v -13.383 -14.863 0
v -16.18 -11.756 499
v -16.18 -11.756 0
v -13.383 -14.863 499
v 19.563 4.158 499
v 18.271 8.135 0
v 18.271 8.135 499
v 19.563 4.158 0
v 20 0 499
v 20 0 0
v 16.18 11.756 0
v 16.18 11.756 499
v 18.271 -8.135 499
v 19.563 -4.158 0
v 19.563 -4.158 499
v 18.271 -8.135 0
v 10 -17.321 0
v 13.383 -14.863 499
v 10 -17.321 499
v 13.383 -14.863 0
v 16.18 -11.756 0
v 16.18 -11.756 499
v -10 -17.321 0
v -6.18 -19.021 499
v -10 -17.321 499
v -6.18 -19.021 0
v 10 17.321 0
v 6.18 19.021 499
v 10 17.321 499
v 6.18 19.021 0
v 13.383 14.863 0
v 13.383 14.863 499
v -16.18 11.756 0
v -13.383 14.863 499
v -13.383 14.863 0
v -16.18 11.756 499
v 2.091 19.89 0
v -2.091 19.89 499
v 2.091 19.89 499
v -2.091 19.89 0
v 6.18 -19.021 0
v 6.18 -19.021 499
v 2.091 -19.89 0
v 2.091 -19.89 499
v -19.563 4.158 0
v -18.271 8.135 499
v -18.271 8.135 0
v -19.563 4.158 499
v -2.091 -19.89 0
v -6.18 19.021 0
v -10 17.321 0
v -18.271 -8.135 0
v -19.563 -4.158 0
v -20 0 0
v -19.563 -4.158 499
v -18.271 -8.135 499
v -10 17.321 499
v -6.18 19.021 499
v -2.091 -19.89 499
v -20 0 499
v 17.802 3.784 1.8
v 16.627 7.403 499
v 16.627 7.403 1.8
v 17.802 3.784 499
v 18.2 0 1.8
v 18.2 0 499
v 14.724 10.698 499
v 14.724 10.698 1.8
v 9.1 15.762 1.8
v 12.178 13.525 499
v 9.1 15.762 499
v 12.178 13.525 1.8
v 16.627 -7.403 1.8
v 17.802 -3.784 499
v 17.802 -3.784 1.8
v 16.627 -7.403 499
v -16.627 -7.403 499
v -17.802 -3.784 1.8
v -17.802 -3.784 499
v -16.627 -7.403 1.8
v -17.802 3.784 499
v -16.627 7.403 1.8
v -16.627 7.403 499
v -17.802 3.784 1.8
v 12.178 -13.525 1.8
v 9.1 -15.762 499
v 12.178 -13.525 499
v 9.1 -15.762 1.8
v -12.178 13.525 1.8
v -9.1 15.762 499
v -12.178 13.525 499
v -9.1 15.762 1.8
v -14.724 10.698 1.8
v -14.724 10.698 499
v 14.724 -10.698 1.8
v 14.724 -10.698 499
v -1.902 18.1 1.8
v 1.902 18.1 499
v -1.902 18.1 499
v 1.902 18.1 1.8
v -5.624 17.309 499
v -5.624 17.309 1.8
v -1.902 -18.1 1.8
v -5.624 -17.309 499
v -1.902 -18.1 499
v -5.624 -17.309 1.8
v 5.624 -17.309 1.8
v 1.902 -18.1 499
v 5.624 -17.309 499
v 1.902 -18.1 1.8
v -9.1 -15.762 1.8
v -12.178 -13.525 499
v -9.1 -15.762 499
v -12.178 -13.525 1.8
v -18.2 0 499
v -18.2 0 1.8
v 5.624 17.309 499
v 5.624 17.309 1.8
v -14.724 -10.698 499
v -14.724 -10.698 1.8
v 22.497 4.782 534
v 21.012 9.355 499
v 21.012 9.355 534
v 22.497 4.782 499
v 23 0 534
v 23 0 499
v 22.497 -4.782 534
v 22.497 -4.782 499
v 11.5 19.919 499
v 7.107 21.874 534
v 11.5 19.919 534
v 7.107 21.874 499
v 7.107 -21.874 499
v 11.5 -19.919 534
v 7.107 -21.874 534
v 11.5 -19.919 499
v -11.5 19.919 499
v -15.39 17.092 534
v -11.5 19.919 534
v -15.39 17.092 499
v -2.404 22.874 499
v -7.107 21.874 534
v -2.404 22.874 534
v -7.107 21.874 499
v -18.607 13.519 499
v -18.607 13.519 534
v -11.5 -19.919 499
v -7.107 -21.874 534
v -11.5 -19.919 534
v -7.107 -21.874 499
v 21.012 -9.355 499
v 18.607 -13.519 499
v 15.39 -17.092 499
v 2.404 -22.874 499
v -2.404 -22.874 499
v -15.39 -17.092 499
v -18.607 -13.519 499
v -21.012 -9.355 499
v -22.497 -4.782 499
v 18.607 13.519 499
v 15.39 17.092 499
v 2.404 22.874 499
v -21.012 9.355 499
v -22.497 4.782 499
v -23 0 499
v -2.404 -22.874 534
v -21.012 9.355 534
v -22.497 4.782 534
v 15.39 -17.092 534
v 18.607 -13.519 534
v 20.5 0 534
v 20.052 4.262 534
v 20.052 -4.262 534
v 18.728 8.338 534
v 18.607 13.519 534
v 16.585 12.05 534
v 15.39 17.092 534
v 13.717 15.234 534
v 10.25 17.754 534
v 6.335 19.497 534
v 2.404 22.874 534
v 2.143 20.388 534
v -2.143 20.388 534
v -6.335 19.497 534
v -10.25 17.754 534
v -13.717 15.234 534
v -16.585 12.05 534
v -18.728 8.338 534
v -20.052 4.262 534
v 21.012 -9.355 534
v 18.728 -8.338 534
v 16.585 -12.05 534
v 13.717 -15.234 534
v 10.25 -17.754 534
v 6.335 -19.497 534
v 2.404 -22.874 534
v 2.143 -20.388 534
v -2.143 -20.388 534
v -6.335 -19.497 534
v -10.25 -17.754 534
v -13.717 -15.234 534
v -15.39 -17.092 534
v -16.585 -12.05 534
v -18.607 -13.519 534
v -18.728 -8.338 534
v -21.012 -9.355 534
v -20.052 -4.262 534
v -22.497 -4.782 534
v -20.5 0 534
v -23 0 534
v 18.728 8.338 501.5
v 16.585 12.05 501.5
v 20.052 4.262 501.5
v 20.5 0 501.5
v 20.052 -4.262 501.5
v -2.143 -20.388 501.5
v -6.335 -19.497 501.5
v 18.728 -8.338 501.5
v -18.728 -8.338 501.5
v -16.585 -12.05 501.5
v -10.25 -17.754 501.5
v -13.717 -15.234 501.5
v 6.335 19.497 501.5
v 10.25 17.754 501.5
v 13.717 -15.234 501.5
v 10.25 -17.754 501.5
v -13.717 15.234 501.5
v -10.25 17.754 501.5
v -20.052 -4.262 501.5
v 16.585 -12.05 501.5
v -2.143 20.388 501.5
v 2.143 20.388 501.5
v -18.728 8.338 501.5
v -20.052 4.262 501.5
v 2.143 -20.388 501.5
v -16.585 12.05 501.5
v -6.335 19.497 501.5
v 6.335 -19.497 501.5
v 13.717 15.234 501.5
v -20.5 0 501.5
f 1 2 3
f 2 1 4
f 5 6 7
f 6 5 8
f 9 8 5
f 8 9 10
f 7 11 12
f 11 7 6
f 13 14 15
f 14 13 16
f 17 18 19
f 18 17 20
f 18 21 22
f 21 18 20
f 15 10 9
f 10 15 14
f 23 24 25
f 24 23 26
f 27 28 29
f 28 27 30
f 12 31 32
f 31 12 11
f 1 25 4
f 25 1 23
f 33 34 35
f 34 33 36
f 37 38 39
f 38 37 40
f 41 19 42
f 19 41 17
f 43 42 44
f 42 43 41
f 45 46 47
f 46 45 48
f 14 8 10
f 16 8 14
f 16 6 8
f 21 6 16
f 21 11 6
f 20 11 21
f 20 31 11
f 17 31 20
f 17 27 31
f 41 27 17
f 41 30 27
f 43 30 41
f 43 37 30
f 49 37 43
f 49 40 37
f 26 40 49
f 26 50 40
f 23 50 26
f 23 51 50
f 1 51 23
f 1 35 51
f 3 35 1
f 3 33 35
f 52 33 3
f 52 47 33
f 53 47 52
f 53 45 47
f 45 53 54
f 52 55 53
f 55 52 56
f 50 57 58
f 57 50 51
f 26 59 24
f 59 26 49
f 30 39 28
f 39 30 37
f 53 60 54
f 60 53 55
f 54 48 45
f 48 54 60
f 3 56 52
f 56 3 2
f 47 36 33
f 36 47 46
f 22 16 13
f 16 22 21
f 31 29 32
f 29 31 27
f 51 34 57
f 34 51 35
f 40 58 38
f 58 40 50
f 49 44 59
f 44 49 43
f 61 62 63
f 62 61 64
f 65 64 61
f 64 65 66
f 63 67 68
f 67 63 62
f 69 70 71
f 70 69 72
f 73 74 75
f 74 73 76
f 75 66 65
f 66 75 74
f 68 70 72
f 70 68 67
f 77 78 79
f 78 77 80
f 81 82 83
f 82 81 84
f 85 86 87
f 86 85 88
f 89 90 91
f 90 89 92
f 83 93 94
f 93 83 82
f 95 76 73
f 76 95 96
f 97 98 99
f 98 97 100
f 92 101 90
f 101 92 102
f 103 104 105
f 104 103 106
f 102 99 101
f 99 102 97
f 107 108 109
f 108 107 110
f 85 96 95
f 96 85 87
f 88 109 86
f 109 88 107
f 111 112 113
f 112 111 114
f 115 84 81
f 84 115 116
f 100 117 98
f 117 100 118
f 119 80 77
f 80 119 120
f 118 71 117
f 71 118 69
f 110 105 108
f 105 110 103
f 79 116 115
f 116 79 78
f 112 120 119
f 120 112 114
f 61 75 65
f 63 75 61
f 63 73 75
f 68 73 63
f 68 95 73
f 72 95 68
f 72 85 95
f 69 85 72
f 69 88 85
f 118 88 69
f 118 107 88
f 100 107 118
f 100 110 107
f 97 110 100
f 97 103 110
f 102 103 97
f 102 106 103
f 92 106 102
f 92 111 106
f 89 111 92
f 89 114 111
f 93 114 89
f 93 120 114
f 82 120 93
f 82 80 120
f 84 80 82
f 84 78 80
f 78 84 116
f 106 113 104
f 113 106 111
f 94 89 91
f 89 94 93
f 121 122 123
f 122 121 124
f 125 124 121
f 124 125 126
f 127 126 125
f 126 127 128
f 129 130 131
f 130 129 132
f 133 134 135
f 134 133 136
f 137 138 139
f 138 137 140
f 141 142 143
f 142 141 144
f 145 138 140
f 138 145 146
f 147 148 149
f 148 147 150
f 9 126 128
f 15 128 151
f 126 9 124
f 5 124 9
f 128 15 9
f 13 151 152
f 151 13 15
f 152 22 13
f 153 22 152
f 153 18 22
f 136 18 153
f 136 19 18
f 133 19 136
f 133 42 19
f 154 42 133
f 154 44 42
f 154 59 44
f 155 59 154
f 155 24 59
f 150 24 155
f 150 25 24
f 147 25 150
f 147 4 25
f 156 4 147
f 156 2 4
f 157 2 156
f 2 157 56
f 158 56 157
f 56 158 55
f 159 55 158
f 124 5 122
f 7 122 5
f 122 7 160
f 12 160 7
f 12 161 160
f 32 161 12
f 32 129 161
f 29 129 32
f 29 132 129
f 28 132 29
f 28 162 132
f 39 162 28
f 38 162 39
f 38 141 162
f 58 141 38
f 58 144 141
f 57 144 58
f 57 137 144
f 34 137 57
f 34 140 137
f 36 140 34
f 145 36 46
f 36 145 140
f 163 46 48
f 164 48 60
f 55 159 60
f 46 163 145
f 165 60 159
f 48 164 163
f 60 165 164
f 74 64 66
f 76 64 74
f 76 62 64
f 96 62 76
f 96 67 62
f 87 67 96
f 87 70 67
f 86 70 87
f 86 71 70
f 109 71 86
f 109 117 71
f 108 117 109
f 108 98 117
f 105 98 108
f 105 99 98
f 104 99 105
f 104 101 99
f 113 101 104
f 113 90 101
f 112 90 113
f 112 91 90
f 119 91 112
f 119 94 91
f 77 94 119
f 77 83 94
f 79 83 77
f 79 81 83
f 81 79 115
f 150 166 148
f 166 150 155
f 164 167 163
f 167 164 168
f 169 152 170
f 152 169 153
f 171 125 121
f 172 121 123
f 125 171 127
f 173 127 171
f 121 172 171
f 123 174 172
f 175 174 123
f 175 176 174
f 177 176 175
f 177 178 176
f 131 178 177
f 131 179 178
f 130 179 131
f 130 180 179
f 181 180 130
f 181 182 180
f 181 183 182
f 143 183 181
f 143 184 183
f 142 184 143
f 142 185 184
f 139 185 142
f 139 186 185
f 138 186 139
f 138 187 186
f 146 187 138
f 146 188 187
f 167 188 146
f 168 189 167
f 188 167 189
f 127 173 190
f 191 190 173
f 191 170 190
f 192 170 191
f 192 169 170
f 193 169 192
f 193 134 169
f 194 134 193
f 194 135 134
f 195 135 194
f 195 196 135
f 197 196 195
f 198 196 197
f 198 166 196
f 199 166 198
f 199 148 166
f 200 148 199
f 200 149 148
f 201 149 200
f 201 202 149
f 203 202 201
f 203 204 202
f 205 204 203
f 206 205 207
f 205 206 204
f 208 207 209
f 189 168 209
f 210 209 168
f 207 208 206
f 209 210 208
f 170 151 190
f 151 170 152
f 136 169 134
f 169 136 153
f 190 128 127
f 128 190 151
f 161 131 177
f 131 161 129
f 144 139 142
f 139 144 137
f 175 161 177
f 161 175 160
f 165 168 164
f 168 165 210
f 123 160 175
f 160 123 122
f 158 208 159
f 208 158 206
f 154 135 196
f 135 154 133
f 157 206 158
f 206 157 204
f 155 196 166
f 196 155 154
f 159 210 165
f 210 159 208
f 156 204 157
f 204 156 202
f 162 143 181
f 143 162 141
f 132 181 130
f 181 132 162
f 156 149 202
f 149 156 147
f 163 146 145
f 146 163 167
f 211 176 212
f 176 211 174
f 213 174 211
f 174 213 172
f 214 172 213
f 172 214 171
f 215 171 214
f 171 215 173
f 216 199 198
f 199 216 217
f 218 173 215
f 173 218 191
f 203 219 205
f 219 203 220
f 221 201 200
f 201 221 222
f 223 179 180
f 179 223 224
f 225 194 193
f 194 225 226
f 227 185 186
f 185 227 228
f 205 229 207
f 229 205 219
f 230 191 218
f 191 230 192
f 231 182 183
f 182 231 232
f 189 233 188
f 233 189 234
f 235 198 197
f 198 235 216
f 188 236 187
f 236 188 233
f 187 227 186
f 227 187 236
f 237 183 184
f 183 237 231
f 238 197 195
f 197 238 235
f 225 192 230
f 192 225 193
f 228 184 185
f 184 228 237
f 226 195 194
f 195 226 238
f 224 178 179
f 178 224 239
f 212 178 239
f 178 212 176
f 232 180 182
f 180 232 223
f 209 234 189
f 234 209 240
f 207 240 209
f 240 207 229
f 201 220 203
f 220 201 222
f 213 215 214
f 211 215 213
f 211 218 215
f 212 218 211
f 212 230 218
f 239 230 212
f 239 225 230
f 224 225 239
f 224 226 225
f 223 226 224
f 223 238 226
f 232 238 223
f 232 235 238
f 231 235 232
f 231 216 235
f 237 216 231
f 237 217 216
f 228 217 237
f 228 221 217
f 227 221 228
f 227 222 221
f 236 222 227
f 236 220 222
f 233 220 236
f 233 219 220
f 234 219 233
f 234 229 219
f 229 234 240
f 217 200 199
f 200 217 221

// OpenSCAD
// Parameters
pipe_standard = 1; //[1:1:1]
nominal_size = 40; //[20:80:1]
length_mm = 500; //[250:1000:10]
ht40_outer_diameter = 40; //[30:60:1]
ht40_wall_thickness = 1.8; //[1:4:0.1]
fitting_length = 35; //[20:70:1]
fitting_outer_diameter = 46; //[40:70:1]
fitting_wall_thickness = 2.5; //[1.5:6:0.1]
overlap_mm = 1; //[0.5:2:0.1]

// HT Pipe - complete geometry
module ht_pipe() {
  color([0.85, 0.85, 0.8]) { // PVC color
    union() {
      // Pipe body
      difference() {
        cylinder(h=length_mm, r=ht40_outer_diameter/2, center=false);
        translate([0, 0, ht40_wall_thickness])
          cylinder(h=length_mm, r=ht40_outer_diameter/2 - ht40_wall_thickness, center=false);
      }
      // End fitting
      difference() {
        translate([0, 0, length_mm - overlap_mm])
          cylinder(h=fitting_length, r=fitting_outer_diameter/2, center=false);
        translate([0, 0, length_mm - overlap_mm + fitting_wall_thickness])
          cylinder(h=fitting_length, r=fitting_outer_diameter/2 - fitting_wall_thickness, center=false);
      }
    }
  }
}

// Assembly
module assembly() {
  ht_pipe();
}

assembly();
